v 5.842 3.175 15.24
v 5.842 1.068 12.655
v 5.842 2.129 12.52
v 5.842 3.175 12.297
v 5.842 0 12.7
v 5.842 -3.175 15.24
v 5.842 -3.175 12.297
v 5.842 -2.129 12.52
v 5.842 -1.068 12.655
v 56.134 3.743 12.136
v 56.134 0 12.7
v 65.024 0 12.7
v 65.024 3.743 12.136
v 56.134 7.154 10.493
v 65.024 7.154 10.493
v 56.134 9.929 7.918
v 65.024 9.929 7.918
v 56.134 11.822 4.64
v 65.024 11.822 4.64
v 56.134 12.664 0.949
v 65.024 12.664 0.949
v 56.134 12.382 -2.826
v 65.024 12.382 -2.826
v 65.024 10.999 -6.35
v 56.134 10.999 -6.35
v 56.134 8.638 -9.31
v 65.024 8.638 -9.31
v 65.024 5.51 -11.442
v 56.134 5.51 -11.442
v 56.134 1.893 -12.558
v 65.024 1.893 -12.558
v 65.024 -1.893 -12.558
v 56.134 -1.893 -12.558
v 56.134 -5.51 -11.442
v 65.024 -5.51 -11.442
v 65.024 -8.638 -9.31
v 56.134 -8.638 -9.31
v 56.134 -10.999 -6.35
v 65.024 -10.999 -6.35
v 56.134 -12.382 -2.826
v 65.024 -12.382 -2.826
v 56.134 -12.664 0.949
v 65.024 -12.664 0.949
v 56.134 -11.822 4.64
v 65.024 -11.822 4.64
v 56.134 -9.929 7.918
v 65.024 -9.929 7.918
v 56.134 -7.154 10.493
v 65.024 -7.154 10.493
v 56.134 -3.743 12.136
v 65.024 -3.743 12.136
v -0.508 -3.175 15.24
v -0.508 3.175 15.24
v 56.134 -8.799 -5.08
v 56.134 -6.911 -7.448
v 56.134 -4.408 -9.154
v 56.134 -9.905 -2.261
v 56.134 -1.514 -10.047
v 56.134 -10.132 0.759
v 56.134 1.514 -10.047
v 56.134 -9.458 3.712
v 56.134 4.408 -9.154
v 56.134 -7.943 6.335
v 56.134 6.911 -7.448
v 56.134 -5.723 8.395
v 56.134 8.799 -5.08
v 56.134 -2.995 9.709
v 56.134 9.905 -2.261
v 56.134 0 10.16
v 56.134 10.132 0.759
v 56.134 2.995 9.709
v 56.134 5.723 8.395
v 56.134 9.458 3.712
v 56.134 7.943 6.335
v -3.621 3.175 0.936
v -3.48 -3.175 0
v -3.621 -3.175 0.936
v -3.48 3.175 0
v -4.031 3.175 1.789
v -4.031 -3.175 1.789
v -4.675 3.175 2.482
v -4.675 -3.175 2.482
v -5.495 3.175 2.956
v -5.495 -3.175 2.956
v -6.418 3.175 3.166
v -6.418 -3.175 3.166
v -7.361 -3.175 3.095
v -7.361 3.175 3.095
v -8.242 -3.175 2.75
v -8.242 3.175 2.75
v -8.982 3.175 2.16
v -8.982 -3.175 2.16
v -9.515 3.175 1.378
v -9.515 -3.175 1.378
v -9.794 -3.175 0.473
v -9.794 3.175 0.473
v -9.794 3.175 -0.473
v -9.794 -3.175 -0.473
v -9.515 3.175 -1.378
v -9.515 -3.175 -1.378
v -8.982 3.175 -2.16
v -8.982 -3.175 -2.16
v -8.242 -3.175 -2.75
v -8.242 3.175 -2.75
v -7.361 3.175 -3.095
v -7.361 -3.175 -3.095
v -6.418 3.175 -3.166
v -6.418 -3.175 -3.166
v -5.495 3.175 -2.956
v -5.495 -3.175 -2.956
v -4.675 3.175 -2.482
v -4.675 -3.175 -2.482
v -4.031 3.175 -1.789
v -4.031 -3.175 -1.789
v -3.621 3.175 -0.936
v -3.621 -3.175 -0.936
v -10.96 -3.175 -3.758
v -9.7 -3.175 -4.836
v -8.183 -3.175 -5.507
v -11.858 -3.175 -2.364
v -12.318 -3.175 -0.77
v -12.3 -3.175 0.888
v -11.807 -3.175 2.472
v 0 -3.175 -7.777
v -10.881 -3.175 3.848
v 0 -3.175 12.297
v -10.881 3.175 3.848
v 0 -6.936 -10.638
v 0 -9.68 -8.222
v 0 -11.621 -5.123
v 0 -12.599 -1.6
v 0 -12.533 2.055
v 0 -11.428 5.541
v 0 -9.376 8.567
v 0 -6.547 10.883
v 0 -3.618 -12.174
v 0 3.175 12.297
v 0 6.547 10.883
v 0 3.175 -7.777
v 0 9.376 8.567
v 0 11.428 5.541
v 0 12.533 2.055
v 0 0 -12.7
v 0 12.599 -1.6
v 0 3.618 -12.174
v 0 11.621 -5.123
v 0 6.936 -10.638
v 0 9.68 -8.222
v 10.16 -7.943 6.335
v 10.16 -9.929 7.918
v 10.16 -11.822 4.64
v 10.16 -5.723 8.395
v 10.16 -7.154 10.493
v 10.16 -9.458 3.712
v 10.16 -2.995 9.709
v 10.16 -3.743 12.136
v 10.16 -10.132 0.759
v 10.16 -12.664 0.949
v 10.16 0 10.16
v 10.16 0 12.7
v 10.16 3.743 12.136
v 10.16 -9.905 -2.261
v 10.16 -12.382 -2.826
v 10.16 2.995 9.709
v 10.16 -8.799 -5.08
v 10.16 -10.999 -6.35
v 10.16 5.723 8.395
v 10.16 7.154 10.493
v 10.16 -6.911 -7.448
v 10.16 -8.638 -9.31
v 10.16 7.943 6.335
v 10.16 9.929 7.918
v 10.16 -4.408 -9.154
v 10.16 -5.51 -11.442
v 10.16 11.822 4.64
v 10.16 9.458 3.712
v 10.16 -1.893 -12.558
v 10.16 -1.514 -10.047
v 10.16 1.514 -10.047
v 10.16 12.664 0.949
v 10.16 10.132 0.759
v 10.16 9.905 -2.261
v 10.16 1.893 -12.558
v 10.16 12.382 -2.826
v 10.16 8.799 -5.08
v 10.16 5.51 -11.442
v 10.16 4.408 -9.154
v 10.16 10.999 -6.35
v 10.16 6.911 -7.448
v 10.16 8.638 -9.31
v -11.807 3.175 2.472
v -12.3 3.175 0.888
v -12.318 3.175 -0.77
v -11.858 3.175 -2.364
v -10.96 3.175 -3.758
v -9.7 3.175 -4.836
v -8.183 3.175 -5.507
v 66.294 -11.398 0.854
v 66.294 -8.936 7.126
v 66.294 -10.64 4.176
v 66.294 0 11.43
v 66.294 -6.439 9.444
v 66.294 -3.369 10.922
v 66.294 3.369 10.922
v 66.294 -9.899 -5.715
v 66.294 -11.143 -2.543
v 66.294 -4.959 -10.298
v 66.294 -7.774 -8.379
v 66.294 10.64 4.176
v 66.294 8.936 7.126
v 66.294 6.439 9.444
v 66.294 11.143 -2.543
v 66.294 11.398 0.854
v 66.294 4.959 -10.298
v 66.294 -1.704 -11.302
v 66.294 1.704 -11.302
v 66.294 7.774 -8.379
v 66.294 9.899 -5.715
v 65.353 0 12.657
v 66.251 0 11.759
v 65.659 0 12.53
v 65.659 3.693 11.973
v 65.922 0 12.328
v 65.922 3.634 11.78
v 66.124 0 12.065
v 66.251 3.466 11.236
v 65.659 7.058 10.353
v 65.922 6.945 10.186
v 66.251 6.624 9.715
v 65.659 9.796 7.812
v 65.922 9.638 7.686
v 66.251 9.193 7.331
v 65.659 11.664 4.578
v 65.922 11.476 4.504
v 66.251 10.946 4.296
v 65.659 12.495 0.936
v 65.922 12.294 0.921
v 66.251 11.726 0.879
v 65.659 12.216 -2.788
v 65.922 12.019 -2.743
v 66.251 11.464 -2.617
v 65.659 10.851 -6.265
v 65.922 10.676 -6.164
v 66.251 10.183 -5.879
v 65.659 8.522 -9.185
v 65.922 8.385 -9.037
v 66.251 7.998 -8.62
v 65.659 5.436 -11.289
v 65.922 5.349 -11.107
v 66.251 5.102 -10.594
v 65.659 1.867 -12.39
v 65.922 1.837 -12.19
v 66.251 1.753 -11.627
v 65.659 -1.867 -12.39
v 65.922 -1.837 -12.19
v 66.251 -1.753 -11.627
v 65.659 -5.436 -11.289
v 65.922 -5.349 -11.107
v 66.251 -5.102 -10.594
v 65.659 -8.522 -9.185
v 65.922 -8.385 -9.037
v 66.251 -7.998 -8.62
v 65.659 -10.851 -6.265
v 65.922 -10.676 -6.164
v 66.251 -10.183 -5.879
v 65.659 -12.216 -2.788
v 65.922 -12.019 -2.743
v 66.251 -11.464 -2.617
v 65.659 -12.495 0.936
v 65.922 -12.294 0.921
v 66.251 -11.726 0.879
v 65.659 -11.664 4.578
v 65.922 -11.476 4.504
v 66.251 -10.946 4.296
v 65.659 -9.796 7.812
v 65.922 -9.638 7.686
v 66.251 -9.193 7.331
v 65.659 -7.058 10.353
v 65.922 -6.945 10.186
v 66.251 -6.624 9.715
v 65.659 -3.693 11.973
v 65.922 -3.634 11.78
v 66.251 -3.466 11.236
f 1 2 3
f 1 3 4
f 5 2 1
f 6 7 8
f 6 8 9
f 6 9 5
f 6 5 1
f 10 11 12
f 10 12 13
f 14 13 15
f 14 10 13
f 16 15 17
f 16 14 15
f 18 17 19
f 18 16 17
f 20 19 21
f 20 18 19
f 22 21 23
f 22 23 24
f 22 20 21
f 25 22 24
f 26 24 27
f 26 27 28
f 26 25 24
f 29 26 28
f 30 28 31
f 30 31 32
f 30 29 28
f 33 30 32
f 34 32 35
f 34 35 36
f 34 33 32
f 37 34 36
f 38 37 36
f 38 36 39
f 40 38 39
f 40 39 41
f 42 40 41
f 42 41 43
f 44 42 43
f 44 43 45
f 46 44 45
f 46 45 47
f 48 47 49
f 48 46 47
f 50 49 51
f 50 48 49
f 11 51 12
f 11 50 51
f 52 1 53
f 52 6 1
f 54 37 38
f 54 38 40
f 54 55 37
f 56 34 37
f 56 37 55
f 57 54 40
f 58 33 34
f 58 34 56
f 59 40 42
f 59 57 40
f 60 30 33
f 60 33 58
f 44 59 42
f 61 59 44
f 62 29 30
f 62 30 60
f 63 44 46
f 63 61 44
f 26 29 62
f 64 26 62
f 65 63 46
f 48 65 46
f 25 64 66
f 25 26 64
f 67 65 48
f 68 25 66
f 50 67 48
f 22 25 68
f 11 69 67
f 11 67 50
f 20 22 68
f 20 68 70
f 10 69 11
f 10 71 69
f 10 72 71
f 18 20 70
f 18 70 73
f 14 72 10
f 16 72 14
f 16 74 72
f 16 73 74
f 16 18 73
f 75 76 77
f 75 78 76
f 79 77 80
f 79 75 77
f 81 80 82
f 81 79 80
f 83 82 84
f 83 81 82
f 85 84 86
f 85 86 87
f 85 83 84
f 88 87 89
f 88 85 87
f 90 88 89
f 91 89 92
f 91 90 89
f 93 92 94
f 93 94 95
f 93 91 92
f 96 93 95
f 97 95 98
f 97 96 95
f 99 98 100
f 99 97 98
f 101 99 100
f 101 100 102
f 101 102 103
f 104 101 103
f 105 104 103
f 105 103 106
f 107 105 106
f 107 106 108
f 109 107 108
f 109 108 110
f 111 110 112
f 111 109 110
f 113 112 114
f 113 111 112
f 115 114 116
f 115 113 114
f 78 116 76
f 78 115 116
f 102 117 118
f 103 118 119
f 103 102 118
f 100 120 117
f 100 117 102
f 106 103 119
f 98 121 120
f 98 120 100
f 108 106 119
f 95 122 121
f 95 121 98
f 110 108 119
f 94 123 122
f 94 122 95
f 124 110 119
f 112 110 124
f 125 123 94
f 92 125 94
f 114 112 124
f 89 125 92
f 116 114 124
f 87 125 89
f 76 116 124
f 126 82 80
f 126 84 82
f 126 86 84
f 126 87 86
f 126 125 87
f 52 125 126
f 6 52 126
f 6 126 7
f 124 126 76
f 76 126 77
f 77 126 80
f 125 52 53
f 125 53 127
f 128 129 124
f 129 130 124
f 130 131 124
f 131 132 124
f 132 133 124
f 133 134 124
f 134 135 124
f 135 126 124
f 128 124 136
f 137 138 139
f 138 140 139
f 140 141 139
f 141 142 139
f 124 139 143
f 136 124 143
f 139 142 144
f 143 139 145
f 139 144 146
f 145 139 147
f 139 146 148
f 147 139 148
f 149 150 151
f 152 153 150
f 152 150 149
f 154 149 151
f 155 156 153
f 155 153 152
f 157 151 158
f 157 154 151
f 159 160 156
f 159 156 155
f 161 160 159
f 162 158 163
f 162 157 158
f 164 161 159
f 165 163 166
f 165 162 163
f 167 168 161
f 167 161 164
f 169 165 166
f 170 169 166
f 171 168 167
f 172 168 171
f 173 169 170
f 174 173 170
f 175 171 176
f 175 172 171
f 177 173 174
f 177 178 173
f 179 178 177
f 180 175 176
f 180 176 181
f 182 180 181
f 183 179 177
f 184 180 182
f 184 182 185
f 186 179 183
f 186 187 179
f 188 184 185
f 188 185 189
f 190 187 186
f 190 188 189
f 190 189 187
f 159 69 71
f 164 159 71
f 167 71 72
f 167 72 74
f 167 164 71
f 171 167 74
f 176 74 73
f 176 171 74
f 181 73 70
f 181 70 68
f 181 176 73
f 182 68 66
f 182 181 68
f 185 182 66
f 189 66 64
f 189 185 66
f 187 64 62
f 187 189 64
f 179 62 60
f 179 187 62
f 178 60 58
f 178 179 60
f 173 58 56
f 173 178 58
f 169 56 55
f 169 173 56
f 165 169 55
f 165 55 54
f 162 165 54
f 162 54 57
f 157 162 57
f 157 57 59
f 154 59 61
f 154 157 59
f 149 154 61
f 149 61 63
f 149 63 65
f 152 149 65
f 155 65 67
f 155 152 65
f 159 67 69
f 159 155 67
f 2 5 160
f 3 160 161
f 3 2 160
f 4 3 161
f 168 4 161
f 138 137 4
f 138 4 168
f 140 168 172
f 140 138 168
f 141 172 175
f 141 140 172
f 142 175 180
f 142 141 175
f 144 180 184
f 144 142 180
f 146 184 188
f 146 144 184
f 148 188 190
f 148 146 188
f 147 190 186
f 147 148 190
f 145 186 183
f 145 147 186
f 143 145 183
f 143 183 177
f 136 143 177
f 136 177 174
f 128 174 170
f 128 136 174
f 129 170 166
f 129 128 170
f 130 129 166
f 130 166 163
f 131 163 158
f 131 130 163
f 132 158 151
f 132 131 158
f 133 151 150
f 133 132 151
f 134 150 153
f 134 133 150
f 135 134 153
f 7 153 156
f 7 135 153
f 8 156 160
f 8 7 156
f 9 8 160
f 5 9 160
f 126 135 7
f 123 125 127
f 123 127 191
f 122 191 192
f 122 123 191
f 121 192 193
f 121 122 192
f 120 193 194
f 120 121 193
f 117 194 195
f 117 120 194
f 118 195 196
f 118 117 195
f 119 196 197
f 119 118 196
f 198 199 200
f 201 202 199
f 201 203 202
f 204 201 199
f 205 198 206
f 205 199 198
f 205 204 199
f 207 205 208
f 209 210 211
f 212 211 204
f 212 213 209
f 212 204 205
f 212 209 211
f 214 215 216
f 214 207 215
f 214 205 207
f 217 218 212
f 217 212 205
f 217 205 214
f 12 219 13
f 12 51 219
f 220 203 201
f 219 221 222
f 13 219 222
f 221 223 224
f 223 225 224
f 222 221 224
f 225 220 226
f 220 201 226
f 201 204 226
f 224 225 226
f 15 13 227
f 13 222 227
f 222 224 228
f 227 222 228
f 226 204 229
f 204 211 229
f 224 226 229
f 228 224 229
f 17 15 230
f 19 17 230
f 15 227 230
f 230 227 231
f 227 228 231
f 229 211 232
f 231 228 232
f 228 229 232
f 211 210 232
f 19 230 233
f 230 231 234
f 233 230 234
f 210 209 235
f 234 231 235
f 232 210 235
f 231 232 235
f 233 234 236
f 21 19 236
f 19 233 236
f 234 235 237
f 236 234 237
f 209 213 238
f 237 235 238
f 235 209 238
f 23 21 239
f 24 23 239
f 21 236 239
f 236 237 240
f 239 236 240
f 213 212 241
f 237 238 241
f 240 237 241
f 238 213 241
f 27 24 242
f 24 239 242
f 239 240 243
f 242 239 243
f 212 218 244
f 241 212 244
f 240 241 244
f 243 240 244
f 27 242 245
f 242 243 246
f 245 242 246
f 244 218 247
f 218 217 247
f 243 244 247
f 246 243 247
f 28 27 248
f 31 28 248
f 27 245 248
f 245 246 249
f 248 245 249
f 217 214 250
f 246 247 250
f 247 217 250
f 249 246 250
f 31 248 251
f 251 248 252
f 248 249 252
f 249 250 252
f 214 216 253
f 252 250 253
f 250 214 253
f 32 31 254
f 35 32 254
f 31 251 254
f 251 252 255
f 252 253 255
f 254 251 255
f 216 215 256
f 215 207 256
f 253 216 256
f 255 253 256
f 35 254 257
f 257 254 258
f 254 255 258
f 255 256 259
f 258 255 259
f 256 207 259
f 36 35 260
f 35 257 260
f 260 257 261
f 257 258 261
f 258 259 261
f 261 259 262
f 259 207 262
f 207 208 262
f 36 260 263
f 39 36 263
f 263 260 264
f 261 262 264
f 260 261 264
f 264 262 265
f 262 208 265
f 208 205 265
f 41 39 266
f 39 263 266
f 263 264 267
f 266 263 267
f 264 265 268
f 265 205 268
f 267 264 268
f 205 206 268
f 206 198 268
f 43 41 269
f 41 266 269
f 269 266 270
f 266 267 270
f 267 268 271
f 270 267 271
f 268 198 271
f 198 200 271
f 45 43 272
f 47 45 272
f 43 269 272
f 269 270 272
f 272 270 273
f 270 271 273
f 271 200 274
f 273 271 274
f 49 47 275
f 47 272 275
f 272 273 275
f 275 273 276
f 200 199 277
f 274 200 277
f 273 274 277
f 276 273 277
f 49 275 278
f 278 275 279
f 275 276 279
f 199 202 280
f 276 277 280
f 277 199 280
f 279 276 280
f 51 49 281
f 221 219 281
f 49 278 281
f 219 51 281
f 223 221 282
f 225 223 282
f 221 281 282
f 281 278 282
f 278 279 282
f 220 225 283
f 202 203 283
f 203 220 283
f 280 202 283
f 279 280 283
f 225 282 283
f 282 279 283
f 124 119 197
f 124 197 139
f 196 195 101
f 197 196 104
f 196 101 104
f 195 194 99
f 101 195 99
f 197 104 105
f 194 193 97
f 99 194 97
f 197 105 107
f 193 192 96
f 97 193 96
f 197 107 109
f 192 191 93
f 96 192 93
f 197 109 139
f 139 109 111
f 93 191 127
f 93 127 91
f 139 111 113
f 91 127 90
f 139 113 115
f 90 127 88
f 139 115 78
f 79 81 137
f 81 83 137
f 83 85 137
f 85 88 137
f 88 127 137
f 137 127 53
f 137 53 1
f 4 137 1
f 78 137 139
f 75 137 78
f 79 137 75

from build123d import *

# Parameters (mm, degrees)
F0_W     = 5.842
F0_H     = 12.7
F0_R     = 3.175
F2_DEPTH = 3.175
F3_R     = 1.27


with BuildPart() as f1:
    # F0 (on Front) → F1 (revolve)
    with BuildSketch(Plane.XZ):
        with Locations((2.921, 6.35)):
            Rectangle(F0_W, F0_H)
        Polygon((5.842, 12.7), (5.842, 0), (66.294, 0), (66.294, 12.7), (56.134, 12.7), (56.134, 10.16), (10.16, 10.16), (10.16, 12.7), align=None)
    revolve(axis=Axis((33.147, 0, 0), (-1, 0, 0)))

    # F0 (on Front) → F2 (join, symmetric)
    with BuildSketch(Plane.XZ):
        with BuildLine():
            Line((-0.9398, 0), (0, 0))
            Line((0, 0), (0, 12.7))
            Line((0, 12.7), (5.842, 12.7))
            Line((5.842, 12.7), (5.842, 15.24))
            Line((5.842, 15.24), (-0.508, 15.24))
            Line((-0.508, 15.24), (-10.88063, 3.847543))
            ThreePointArc((-10.88063, 3.847543), (-4.591961, 5.329721), (-0.9398, 0))
        make_face()
        with BuildLine():
            ThreePointArc((-8.182663, -5.506983), (-3.195791, -4.549339), (-0.9398, 0))
            ThreePointArc((-0.9398, 0), (-4.591961, 5.329721), (-10.88063, 3.847543))
            ThreePointArc((-10.88063, 3.847543), (-12.145978, -1.583727), (-8.182663, -5.506983))
        make_face()
        with Locations((-6.6548, 0)):
            Circle(F0_R, mode=Mode.SUBTRACT)
        with BuildLine():
            Line((5.842, 0), (0, 0))
            Line((0, 0), (-0.9398, 0))
            ThreePointArc((-0.9398, 0), (-3.195791, -4.549339), (-8.182663, -5.506983))
            Line((-8.182663, -5.506983), (5.842, -9.398))
            Line((5.842, -9.398), (5.842, 0))
        make_face()
        with Locations((2.921, 6.35)):
            Rectangle(F0_W, F0_H)
    extrude(amount=F2_DEPTH, both=True)

    # F3
    f3_edges = [f1.edges().sort_by_distance(p)[0] for p in [
        (66.294, 0, -12.7),
    ]]
    fillet(f3_edges, radius=F3_R)


solid = f1.part
